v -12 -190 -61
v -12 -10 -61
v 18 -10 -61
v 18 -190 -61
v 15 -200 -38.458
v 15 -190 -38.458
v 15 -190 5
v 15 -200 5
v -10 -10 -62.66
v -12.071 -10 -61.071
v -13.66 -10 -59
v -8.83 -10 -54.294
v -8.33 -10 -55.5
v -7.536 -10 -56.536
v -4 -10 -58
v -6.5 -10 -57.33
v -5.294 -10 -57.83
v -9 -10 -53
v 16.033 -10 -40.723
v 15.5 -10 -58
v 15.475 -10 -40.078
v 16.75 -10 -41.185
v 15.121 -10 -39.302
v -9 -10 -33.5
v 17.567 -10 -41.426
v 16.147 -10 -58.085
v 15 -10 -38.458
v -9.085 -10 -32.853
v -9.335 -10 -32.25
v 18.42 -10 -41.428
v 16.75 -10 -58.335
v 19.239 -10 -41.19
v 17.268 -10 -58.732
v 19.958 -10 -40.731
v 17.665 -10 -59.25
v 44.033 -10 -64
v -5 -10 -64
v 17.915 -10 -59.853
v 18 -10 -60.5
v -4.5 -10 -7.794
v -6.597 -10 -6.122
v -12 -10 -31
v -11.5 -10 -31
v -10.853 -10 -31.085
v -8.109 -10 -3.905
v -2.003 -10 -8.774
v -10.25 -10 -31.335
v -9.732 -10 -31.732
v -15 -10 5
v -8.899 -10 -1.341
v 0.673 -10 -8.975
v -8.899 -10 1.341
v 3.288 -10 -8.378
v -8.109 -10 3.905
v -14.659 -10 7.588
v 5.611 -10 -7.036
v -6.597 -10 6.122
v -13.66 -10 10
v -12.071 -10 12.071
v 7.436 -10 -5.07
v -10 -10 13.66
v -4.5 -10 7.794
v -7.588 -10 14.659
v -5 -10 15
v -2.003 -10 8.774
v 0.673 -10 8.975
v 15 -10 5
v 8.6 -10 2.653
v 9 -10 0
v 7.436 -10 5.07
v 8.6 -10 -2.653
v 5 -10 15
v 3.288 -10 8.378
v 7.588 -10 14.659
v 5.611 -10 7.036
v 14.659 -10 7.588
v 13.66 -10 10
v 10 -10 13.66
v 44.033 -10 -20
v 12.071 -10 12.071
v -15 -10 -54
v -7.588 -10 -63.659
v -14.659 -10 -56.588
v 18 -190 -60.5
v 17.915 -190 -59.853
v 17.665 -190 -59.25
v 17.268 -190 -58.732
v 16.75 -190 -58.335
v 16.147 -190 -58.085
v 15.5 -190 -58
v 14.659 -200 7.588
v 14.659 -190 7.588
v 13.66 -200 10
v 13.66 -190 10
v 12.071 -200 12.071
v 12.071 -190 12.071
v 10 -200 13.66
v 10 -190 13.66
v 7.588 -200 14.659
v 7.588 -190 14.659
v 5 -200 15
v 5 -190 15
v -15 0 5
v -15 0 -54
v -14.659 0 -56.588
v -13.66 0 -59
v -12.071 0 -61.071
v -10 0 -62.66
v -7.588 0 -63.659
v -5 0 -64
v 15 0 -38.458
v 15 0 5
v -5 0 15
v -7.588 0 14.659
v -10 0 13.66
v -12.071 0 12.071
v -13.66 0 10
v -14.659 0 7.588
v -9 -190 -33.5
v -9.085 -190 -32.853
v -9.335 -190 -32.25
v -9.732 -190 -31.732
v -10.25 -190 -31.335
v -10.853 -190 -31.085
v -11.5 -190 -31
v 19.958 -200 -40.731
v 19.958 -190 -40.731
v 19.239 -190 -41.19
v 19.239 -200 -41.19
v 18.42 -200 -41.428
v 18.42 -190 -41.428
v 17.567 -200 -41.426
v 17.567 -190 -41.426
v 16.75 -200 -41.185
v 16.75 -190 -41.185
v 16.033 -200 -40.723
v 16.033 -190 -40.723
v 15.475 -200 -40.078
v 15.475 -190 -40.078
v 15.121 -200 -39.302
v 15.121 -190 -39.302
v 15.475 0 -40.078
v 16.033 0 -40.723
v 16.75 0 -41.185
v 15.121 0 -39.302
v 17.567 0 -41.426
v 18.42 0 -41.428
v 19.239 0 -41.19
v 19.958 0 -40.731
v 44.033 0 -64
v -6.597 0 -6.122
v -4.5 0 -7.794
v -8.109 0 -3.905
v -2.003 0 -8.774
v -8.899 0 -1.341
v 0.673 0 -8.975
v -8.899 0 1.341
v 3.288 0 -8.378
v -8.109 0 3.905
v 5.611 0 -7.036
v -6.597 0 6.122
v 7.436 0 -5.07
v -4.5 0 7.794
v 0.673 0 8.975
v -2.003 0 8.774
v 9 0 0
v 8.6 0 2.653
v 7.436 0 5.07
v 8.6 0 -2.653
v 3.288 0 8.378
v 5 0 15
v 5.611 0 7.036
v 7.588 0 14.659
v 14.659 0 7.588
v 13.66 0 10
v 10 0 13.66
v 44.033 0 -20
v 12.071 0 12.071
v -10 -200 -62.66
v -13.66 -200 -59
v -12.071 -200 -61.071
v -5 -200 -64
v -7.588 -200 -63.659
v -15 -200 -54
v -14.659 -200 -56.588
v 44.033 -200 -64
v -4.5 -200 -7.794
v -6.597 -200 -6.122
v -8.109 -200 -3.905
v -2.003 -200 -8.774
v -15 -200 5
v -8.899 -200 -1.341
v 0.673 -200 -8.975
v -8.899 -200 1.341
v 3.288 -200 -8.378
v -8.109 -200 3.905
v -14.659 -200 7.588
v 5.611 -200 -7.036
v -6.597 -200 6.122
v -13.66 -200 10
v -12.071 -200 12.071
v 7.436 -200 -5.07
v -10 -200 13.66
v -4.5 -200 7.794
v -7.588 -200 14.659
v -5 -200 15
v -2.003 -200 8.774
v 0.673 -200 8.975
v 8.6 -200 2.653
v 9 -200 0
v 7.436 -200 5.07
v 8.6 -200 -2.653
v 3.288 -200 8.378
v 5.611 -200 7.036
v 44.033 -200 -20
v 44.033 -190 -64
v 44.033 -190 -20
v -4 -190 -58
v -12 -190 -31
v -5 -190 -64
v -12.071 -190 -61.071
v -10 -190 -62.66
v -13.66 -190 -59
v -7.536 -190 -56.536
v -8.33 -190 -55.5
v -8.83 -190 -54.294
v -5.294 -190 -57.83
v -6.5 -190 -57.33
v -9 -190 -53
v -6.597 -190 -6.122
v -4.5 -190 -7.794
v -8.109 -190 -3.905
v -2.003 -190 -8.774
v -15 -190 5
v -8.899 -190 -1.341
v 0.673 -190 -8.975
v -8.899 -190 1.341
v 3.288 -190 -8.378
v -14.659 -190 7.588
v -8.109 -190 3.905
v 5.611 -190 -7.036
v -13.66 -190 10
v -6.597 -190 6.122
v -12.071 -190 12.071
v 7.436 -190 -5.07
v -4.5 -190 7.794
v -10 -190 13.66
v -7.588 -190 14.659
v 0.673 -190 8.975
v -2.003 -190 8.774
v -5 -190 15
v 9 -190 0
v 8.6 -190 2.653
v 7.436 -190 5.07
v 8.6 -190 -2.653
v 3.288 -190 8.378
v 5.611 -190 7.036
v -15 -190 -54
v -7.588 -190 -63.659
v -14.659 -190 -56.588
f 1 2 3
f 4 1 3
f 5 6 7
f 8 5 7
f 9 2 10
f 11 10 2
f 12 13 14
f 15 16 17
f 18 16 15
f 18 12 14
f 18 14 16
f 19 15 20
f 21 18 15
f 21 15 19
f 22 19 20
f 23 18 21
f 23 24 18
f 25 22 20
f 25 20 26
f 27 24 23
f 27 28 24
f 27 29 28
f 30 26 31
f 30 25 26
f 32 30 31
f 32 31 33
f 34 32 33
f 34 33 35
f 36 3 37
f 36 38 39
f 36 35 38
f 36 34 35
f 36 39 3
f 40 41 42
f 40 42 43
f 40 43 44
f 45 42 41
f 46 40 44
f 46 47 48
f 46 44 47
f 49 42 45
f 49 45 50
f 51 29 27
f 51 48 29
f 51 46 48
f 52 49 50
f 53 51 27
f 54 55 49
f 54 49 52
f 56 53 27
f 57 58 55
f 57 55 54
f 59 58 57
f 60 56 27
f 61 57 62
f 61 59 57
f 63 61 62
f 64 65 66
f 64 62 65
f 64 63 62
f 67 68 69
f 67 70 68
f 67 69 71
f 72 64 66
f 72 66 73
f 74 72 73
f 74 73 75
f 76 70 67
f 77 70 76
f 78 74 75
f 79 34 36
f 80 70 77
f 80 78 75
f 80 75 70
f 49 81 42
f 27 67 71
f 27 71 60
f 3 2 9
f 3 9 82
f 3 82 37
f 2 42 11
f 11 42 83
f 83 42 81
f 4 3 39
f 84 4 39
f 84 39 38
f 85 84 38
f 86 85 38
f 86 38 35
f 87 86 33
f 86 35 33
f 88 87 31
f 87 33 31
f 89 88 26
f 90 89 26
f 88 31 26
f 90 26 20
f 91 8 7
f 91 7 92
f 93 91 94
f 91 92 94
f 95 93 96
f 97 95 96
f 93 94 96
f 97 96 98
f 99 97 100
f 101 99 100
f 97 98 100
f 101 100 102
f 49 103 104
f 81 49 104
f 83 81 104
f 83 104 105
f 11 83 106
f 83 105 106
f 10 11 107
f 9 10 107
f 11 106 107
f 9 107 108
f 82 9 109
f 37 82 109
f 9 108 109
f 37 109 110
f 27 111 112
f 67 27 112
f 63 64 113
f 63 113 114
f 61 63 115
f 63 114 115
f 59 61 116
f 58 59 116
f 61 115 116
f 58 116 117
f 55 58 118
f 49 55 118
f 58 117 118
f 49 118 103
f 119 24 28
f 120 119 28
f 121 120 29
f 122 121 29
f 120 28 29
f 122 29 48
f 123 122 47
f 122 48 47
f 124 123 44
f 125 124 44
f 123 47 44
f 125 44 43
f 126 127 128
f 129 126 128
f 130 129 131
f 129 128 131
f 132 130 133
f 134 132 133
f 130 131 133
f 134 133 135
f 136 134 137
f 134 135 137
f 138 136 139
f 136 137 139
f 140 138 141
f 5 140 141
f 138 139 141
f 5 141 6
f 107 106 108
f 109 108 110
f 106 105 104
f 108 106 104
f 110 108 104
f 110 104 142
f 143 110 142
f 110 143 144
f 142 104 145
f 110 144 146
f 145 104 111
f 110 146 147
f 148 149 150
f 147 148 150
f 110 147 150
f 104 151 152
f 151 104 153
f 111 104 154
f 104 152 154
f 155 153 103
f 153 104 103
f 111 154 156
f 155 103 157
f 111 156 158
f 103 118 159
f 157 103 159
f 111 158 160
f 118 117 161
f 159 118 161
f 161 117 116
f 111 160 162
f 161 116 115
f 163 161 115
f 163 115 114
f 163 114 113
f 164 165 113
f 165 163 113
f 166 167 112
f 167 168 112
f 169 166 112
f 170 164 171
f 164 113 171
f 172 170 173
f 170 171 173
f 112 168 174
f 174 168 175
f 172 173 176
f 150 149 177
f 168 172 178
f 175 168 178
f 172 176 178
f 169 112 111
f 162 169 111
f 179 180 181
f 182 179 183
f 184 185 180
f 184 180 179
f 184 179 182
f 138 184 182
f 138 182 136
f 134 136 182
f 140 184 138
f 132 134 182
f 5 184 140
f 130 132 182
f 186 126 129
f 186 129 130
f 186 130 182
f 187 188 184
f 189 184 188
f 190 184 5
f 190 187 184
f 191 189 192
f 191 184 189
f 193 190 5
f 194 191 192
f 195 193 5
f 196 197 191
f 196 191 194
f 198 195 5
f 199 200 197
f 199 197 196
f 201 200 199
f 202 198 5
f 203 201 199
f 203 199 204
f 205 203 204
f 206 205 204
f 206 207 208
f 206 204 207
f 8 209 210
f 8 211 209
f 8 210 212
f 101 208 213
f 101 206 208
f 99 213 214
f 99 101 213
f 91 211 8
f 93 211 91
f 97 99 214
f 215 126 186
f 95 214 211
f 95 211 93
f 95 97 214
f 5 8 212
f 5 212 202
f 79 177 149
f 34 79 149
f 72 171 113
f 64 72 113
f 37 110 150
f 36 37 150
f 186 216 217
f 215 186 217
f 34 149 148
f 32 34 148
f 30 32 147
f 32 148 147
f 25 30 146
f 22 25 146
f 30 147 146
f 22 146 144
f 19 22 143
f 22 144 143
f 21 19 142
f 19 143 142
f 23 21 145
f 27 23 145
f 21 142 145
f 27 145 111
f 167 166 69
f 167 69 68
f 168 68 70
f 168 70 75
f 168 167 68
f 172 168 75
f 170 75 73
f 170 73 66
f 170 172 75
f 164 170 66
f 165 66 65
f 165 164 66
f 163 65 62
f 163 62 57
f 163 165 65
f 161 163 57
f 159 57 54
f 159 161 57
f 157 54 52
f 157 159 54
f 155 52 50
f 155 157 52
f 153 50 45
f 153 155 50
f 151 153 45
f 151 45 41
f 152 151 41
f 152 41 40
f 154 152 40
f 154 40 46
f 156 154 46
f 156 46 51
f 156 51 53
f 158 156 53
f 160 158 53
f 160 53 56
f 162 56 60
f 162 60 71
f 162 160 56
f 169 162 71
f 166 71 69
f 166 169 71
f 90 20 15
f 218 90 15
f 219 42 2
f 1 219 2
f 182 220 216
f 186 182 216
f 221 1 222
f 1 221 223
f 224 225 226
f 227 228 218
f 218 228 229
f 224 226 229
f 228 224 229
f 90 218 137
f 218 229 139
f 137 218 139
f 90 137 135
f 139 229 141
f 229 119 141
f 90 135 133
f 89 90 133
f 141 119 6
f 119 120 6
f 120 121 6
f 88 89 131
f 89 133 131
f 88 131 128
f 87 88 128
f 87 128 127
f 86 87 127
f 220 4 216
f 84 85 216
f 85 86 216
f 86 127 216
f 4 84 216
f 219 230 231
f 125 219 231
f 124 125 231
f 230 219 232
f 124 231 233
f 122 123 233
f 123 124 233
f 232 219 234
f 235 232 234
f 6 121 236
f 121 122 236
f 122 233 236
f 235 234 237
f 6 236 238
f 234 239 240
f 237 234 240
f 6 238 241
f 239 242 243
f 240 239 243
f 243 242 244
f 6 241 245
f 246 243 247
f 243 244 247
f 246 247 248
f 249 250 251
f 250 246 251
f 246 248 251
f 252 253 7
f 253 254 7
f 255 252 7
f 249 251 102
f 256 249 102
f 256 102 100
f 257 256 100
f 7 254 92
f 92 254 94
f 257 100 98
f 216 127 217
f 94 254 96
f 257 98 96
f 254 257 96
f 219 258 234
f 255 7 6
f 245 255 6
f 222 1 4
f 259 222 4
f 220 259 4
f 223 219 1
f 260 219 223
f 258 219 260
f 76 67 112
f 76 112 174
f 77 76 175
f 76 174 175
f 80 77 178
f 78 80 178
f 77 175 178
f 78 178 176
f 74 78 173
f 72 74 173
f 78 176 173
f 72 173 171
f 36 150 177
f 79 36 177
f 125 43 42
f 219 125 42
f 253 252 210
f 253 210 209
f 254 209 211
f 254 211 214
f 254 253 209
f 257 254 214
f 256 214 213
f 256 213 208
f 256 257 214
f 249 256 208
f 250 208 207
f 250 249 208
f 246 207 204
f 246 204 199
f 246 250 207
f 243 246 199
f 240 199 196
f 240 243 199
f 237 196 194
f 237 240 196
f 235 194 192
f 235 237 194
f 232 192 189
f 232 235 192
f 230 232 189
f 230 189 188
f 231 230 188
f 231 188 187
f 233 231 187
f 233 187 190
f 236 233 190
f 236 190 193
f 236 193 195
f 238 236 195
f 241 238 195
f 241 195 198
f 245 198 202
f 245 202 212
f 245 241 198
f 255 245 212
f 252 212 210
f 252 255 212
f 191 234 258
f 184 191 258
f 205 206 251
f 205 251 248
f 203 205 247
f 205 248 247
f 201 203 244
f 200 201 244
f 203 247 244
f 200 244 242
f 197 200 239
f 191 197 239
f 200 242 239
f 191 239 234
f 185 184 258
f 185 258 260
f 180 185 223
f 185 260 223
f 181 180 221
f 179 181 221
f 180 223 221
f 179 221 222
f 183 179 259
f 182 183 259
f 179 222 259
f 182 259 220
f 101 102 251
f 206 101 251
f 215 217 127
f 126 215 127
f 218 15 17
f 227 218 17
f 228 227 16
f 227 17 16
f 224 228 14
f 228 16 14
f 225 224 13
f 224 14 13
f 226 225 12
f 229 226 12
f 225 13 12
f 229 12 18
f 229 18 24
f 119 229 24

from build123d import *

# Parameters (mm, degrees)
F0_R     = 9
F1_DEPTH = 10
F7_DEPTH = 180
F8_R     = 9
F9_DEPTH = 10


# Not quite as in the source:
# - a feature of the source that left no trace in its solid (it failed there, or was rolled back) is left out


with BuildPart() as f1:
    # F0 (on Front) → F1 (new body)
    with BuildSketch(Plane.XZ):
        with BuildLine():
            Line((5, 15), (-5, 15))
            ThreePointArc((-5, 15), (-12.0710678119, 12.0710678119), (-15, 5))
            Line((-15, 5), (-15, -54))
            ThreePointArc((-15, -54), (-12.0710678119, -61.0710678119), (-5, -64))
            Line((-5, -64), (44.0328441188, -64))
            Line((44.0328441188, -64), (44.0328441188, -20))
            Line((44.0328441188, -20), (19.9575467156, -40.731087613))
            ThreePointArc((19.9575467156, -40.731087613), (16.7495281184, -41.1847233597), (15, -38.4577616671))
            Line((15, -38.4577616671), (15, 5))
            ThreePointArc((15, 5), (12.0710678119, 12.0710678119), (5, 15))
        make_face()
        Circle(F0_R, mode=Mode.SUBTRACT)
    extrude(amount=F1_DEPTH)

    # F6 (on face) → F7 (join)
    with BuildSketch(Plane.XZ.offset(10)):
        with BuildLine():
            Line((-12, -61), (18, -61))
            Line((18, -61), (18, -60.5))
            ThreePointArc((18, -60.5), (17.267766953, -58.732233047), (15.5, -58))
            Line((15.5, -58), (-4, -58))
            ThreePointArc((-4, -58), (-7.5355339059, -56.5355339059), (-9, -53))
            Line((-9, -53), (-9, -33.5))
            ThreePointArc((-9, -33.5), (-9.732233047, -31.732233047), (-11.5, -31))
            Line((-11.5, -31), (-12, -31))
            Line((-12, -31), (-12, -61))
        make_face()
    extrude(amount=F7_DEPTH)

    # F8 (on face) → F9 (join)
    with BuildSketch(Plane.XZ.offset(190)):
        with BuildLine():
            Line((5, 15), (-5, 15))
            ThreePointArc((-5, 15), (-12.0710678119, 12.0710678119), (-15, 5))
            Line((-15, 5), (-15, -54))
            ThreePointArc((-15, -54), (-12.0710678119, -61.0710678119), (-5, -64))
            Line((-5, -64), (44.0328441188, -64))
            Line((44.0328441188, -64), (44.0328441188, -20))
            Line((44.0328441188, -20), (19.9575467156, -40.731087613))
            ThreePointArc((19.9575467156, -40.731087613), (16.7495281184, -41.1847233597), (15, -38.4577616671))
            Line((15, -38.4577616671), (15, 5))
            ThreePointArc((15, 5), (12.0710678119, 12.0710678119), (5, 15))
        make_face()
        Circle(F8_R, mode=Mode.SUBTRACT)
    extrude(amount=F9_DEPTH)


solid = f1.part
